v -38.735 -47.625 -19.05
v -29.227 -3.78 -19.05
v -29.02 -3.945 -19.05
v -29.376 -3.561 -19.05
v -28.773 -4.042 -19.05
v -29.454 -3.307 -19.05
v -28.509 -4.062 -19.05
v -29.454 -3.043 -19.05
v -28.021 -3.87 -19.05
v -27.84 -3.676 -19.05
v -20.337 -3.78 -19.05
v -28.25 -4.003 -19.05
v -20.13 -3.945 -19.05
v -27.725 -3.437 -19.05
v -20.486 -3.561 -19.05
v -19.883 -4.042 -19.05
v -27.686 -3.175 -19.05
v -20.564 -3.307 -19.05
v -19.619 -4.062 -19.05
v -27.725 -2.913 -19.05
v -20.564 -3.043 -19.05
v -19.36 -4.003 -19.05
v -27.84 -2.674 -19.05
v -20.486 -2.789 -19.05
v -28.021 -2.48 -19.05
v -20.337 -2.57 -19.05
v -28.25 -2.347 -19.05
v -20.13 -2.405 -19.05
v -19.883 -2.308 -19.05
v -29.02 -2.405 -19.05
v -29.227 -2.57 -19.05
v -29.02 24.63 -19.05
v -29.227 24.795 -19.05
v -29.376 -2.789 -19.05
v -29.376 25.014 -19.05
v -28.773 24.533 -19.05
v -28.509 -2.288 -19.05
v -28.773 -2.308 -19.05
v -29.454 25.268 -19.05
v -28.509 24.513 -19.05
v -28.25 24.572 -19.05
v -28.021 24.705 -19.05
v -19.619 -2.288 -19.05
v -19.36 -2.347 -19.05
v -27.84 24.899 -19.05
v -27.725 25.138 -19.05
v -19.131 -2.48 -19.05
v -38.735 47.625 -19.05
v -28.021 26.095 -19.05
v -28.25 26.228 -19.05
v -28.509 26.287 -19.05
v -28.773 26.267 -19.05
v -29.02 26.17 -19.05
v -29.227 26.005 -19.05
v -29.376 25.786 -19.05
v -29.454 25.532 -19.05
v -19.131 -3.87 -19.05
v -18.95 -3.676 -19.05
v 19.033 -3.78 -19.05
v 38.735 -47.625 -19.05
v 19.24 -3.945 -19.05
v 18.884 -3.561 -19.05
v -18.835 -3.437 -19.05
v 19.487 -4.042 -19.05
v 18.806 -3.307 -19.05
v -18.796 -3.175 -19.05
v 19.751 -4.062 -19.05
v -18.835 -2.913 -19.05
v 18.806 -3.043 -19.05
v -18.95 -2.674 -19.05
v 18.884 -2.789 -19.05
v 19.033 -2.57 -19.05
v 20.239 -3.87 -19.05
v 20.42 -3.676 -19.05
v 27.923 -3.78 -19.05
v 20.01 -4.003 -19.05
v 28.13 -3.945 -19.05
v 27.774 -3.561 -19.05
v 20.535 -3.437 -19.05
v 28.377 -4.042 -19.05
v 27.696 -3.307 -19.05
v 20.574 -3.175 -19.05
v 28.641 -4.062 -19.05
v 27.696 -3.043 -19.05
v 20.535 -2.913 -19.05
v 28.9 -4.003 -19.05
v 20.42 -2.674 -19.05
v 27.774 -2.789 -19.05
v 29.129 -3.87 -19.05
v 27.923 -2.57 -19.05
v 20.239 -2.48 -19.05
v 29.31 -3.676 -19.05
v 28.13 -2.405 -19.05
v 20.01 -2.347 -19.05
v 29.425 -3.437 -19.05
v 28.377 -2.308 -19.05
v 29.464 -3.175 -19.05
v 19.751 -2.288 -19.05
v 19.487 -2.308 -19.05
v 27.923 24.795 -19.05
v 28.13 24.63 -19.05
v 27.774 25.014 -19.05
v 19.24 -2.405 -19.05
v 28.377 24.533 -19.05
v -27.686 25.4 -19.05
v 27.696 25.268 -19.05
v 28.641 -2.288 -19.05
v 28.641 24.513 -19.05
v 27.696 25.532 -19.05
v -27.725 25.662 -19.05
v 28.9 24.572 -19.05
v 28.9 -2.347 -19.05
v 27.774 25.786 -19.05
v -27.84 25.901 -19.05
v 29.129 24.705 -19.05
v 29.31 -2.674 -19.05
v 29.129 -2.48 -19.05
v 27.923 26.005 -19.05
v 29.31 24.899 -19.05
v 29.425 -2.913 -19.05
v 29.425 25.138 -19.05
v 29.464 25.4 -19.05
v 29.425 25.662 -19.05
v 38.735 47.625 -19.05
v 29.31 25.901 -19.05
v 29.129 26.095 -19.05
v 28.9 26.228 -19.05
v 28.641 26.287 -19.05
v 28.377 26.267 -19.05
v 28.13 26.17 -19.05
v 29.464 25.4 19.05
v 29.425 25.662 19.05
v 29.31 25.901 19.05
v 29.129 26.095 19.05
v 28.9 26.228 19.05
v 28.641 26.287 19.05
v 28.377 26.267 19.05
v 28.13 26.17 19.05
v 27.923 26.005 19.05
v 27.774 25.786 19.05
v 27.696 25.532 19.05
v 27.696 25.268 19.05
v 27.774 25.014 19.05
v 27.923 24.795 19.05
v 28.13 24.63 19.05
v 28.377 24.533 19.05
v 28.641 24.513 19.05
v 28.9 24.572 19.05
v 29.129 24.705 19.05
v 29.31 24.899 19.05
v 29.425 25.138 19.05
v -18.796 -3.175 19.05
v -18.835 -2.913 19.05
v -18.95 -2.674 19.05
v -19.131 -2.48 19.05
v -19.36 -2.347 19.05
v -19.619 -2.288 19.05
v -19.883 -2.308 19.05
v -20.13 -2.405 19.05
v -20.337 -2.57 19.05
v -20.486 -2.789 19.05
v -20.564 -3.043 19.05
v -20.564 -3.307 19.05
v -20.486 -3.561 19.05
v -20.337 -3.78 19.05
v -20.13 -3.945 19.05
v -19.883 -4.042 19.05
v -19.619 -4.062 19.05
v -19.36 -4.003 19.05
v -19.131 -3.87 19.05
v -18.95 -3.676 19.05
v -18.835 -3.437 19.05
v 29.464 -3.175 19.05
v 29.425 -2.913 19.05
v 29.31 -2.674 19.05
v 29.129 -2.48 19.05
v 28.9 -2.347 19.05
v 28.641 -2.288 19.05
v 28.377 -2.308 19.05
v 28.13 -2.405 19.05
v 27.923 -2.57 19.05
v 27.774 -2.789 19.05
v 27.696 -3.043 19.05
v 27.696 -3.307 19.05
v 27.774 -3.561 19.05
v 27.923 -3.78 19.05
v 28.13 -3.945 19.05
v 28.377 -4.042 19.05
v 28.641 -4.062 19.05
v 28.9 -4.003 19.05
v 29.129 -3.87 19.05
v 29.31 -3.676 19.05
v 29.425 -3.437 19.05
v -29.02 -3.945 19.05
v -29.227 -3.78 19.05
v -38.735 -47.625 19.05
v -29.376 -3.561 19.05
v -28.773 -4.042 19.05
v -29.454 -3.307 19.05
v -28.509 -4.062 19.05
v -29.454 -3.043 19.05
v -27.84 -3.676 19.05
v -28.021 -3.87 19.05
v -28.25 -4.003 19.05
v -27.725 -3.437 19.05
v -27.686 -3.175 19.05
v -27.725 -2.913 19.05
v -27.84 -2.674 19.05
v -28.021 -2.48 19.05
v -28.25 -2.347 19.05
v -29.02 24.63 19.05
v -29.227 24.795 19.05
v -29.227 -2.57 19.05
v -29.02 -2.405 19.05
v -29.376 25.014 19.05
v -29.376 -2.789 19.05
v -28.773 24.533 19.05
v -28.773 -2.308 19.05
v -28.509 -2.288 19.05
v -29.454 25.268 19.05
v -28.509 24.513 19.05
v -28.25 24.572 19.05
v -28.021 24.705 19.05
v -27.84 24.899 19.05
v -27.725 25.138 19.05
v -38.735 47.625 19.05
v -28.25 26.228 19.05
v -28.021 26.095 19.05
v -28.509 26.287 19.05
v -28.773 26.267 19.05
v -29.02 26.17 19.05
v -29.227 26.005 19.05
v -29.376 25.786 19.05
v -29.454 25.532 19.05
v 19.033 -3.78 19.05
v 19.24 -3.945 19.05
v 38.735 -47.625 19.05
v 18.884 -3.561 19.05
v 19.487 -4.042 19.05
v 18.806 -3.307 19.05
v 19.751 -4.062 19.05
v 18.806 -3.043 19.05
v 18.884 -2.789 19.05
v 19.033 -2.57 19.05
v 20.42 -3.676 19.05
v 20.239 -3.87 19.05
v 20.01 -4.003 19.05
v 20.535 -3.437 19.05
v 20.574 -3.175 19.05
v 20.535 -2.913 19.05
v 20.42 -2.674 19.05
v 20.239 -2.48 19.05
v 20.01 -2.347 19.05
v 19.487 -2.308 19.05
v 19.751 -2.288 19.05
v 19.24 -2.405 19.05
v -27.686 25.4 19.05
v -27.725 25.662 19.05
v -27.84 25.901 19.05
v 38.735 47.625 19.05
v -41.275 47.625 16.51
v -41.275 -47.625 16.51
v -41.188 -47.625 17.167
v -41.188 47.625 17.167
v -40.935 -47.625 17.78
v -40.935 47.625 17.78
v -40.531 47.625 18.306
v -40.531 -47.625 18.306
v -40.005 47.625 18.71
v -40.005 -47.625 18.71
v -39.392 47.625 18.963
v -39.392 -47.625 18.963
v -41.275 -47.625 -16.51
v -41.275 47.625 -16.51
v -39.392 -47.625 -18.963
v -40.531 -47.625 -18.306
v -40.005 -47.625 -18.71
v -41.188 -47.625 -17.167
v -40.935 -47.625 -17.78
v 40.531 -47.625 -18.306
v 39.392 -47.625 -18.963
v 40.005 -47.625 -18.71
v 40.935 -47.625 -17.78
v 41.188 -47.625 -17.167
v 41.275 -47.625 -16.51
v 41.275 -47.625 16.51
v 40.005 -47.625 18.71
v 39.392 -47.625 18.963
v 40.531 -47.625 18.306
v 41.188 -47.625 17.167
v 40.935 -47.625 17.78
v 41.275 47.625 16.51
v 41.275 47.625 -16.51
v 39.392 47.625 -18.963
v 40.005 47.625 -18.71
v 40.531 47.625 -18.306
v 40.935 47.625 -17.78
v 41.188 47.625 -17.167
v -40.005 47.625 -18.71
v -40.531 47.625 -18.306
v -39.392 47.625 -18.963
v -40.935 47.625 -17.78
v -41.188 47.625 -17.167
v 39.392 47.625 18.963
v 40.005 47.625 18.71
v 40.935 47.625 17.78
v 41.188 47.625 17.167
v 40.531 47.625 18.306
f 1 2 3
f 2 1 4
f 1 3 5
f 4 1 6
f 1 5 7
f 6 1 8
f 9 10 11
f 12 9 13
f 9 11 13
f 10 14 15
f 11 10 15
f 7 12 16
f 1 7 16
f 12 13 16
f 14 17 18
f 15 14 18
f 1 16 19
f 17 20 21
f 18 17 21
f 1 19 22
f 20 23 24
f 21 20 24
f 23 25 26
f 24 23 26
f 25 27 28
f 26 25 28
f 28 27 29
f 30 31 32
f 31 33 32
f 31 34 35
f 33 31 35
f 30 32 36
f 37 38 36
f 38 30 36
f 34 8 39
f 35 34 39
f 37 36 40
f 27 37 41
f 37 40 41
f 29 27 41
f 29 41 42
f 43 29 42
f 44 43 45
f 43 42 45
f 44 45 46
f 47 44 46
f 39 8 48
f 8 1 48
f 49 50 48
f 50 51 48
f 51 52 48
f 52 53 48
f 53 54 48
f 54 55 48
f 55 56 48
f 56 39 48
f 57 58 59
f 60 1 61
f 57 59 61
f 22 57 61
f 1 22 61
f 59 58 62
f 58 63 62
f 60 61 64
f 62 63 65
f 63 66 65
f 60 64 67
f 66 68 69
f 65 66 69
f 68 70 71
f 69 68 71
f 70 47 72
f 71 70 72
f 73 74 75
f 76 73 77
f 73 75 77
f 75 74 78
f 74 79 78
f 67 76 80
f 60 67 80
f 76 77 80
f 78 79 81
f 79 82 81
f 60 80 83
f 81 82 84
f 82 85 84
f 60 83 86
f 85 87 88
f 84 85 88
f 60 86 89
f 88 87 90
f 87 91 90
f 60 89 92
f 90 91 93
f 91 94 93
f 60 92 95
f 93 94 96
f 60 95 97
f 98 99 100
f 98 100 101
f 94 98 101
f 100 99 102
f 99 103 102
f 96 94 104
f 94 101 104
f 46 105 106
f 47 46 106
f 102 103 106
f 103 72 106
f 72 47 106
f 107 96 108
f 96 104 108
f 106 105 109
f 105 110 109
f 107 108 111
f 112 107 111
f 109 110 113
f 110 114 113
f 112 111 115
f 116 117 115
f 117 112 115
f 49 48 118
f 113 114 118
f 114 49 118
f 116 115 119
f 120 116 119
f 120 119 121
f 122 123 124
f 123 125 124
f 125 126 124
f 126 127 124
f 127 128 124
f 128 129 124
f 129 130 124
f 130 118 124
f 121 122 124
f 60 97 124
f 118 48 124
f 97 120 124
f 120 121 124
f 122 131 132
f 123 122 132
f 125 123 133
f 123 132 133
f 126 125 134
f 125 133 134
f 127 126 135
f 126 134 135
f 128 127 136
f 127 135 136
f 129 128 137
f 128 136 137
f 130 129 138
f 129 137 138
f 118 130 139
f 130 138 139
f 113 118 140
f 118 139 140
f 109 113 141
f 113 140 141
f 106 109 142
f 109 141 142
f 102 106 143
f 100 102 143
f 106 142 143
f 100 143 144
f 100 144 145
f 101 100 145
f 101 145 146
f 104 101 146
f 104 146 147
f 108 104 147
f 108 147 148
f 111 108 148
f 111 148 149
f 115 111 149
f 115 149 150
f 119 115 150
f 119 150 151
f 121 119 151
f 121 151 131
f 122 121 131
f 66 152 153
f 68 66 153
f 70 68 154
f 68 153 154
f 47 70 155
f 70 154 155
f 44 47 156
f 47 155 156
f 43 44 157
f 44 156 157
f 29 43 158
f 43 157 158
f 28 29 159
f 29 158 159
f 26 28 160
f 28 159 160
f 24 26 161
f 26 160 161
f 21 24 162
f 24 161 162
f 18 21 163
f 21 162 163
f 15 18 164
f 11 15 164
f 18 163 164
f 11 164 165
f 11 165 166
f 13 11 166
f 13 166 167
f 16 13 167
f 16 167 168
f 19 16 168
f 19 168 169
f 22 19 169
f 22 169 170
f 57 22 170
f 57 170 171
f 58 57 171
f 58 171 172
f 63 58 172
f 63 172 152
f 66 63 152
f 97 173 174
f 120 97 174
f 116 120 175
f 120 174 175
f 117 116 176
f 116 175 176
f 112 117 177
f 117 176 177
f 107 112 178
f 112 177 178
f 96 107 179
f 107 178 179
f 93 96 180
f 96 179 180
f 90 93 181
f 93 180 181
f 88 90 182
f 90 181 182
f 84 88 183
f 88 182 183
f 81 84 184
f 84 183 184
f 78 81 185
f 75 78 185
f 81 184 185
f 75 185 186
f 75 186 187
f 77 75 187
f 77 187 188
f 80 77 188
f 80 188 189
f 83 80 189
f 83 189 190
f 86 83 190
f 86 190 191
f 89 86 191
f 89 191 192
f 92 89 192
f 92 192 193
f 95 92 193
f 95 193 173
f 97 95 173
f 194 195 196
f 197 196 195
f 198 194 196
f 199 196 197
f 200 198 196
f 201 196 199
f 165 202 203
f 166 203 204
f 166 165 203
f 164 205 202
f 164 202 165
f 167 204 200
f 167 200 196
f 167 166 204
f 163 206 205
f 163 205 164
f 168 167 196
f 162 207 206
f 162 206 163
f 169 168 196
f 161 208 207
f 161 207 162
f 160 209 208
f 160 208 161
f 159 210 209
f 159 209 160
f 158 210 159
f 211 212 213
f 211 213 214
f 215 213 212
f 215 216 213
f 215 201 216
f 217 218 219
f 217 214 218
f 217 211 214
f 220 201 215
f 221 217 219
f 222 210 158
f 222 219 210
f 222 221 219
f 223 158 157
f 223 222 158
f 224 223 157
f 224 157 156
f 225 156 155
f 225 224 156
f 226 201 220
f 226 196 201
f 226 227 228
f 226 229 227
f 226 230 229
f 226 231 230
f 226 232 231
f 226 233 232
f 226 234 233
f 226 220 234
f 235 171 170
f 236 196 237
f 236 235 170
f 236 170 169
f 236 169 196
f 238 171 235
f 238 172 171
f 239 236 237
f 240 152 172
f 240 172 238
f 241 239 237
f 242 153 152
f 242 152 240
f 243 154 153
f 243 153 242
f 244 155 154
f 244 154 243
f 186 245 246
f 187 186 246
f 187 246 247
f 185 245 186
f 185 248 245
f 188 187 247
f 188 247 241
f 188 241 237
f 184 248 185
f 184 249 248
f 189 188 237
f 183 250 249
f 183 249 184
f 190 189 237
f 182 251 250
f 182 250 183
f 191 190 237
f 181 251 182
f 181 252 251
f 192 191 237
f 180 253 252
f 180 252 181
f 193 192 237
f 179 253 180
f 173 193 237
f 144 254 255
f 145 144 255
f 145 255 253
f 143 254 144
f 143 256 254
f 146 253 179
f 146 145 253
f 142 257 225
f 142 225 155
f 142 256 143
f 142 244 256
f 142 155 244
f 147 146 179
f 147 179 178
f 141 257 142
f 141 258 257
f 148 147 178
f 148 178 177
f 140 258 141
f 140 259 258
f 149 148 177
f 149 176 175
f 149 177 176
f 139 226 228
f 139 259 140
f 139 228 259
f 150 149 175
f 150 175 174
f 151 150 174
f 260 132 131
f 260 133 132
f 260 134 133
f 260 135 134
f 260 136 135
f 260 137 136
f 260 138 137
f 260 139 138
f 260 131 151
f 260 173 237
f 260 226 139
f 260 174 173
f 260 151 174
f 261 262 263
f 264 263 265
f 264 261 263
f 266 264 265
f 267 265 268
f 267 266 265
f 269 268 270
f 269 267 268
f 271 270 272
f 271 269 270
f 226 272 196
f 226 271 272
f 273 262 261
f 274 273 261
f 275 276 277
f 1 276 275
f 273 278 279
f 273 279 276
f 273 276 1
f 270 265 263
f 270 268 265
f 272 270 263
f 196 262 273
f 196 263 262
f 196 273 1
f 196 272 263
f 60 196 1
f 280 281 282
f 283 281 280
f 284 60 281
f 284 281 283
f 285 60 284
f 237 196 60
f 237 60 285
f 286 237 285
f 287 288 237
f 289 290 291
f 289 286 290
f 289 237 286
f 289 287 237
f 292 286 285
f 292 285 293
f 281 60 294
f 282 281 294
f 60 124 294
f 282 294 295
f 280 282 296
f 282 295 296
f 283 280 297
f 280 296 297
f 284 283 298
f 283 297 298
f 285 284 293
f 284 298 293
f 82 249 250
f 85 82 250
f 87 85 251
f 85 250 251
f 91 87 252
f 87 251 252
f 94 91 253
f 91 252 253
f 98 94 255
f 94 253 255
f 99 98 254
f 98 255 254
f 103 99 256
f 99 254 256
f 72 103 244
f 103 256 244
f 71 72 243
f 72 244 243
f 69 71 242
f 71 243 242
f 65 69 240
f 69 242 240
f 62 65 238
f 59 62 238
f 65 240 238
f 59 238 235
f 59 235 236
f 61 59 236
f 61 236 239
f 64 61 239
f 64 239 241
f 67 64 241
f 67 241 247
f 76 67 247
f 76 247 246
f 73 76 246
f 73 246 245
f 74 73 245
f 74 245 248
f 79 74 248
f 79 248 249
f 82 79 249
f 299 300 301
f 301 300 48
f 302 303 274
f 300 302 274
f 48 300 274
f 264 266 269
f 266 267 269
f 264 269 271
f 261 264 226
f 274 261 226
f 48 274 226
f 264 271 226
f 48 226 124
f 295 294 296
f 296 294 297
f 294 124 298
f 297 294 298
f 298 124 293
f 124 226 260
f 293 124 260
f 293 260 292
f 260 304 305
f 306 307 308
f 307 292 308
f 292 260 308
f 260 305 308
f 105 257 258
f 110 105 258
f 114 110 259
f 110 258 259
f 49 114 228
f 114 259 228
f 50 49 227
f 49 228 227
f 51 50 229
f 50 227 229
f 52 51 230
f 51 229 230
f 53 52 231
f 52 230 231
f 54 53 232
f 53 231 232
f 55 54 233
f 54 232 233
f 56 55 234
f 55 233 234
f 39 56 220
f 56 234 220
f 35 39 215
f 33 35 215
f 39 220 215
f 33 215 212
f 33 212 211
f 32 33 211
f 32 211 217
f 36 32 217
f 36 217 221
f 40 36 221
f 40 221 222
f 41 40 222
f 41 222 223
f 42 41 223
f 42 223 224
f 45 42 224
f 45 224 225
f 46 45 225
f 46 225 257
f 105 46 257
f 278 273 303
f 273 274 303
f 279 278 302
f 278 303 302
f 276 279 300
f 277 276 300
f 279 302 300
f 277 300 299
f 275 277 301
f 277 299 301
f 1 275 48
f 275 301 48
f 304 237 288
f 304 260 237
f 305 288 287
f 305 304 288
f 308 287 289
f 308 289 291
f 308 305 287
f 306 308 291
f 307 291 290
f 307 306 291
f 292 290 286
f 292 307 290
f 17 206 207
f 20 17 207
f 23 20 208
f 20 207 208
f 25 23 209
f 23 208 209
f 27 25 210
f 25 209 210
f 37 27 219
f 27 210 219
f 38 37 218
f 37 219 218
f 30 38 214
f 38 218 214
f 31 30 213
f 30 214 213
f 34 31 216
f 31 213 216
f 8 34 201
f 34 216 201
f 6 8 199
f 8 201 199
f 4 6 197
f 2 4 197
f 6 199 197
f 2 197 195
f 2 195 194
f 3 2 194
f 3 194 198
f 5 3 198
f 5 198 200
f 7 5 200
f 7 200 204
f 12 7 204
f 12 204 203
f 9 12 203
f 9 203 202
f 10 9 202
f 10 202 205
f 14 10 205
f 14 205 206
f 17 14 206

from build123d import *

# Parameters (mm, degrees)
SKETCH1_W           = 82.55
SKETCH1_H           = 95.25
BOSS_EXTRUDE1_DEPTH = 19.05
SKETCH2_R           = 0.889
CUT_EXTRUDE1_DEPTH  = 74.643575755
FILLET1_R           = 2.54


with BuildPart() as part:
    # Sketch1 → Boss-Extrude1 (new, symmetric)
    with BuildSketch(Plane.XY):
        Rectangle(SKETCH1_W, SKETCH1_H)
    extrude(amount=BOSS_EXTRUDE1_DEPTH, both=True)

    # Sketch2 → Cut-Extrude1 (cut, through all)
    with BuildSketch(Plane.XY.offset(19.05)):
        with Locations((-28.575, 25.4)):
            Circle(SKETCH2_R)
        with Locations((28.575, 25.4)):
            Circle(SKETCH2_R)
        with Locations((28.575, -3.175)):
            Circle(SKETCH2_R)
        with Locations((-28.575, -3.175)):
            Circle(SKETCH2_R)
        with Locations((-19.685, -3.175)):
            Circle(SKETCH2_R)
        with Locations((19.685, -3.175)):
            Circle(SKETCH2_R)
    extrude(amount=-CUT_EXTRUDE1_DEPTH, mode=Mode.SUBTRACT)

    # Fillet1
    fillet1_edges = [part.edges().sort_by_distance(p)[0] for p in [
        (-41.275, 0, 19.05),
        (41.275, 0, 19.05),
        (-41.275, 0, -19.05),
        (41.275, 0, -19.05),
    ]]
    fillet(fillet1_edges, radius=FILLET1_R)


solid = part.part
